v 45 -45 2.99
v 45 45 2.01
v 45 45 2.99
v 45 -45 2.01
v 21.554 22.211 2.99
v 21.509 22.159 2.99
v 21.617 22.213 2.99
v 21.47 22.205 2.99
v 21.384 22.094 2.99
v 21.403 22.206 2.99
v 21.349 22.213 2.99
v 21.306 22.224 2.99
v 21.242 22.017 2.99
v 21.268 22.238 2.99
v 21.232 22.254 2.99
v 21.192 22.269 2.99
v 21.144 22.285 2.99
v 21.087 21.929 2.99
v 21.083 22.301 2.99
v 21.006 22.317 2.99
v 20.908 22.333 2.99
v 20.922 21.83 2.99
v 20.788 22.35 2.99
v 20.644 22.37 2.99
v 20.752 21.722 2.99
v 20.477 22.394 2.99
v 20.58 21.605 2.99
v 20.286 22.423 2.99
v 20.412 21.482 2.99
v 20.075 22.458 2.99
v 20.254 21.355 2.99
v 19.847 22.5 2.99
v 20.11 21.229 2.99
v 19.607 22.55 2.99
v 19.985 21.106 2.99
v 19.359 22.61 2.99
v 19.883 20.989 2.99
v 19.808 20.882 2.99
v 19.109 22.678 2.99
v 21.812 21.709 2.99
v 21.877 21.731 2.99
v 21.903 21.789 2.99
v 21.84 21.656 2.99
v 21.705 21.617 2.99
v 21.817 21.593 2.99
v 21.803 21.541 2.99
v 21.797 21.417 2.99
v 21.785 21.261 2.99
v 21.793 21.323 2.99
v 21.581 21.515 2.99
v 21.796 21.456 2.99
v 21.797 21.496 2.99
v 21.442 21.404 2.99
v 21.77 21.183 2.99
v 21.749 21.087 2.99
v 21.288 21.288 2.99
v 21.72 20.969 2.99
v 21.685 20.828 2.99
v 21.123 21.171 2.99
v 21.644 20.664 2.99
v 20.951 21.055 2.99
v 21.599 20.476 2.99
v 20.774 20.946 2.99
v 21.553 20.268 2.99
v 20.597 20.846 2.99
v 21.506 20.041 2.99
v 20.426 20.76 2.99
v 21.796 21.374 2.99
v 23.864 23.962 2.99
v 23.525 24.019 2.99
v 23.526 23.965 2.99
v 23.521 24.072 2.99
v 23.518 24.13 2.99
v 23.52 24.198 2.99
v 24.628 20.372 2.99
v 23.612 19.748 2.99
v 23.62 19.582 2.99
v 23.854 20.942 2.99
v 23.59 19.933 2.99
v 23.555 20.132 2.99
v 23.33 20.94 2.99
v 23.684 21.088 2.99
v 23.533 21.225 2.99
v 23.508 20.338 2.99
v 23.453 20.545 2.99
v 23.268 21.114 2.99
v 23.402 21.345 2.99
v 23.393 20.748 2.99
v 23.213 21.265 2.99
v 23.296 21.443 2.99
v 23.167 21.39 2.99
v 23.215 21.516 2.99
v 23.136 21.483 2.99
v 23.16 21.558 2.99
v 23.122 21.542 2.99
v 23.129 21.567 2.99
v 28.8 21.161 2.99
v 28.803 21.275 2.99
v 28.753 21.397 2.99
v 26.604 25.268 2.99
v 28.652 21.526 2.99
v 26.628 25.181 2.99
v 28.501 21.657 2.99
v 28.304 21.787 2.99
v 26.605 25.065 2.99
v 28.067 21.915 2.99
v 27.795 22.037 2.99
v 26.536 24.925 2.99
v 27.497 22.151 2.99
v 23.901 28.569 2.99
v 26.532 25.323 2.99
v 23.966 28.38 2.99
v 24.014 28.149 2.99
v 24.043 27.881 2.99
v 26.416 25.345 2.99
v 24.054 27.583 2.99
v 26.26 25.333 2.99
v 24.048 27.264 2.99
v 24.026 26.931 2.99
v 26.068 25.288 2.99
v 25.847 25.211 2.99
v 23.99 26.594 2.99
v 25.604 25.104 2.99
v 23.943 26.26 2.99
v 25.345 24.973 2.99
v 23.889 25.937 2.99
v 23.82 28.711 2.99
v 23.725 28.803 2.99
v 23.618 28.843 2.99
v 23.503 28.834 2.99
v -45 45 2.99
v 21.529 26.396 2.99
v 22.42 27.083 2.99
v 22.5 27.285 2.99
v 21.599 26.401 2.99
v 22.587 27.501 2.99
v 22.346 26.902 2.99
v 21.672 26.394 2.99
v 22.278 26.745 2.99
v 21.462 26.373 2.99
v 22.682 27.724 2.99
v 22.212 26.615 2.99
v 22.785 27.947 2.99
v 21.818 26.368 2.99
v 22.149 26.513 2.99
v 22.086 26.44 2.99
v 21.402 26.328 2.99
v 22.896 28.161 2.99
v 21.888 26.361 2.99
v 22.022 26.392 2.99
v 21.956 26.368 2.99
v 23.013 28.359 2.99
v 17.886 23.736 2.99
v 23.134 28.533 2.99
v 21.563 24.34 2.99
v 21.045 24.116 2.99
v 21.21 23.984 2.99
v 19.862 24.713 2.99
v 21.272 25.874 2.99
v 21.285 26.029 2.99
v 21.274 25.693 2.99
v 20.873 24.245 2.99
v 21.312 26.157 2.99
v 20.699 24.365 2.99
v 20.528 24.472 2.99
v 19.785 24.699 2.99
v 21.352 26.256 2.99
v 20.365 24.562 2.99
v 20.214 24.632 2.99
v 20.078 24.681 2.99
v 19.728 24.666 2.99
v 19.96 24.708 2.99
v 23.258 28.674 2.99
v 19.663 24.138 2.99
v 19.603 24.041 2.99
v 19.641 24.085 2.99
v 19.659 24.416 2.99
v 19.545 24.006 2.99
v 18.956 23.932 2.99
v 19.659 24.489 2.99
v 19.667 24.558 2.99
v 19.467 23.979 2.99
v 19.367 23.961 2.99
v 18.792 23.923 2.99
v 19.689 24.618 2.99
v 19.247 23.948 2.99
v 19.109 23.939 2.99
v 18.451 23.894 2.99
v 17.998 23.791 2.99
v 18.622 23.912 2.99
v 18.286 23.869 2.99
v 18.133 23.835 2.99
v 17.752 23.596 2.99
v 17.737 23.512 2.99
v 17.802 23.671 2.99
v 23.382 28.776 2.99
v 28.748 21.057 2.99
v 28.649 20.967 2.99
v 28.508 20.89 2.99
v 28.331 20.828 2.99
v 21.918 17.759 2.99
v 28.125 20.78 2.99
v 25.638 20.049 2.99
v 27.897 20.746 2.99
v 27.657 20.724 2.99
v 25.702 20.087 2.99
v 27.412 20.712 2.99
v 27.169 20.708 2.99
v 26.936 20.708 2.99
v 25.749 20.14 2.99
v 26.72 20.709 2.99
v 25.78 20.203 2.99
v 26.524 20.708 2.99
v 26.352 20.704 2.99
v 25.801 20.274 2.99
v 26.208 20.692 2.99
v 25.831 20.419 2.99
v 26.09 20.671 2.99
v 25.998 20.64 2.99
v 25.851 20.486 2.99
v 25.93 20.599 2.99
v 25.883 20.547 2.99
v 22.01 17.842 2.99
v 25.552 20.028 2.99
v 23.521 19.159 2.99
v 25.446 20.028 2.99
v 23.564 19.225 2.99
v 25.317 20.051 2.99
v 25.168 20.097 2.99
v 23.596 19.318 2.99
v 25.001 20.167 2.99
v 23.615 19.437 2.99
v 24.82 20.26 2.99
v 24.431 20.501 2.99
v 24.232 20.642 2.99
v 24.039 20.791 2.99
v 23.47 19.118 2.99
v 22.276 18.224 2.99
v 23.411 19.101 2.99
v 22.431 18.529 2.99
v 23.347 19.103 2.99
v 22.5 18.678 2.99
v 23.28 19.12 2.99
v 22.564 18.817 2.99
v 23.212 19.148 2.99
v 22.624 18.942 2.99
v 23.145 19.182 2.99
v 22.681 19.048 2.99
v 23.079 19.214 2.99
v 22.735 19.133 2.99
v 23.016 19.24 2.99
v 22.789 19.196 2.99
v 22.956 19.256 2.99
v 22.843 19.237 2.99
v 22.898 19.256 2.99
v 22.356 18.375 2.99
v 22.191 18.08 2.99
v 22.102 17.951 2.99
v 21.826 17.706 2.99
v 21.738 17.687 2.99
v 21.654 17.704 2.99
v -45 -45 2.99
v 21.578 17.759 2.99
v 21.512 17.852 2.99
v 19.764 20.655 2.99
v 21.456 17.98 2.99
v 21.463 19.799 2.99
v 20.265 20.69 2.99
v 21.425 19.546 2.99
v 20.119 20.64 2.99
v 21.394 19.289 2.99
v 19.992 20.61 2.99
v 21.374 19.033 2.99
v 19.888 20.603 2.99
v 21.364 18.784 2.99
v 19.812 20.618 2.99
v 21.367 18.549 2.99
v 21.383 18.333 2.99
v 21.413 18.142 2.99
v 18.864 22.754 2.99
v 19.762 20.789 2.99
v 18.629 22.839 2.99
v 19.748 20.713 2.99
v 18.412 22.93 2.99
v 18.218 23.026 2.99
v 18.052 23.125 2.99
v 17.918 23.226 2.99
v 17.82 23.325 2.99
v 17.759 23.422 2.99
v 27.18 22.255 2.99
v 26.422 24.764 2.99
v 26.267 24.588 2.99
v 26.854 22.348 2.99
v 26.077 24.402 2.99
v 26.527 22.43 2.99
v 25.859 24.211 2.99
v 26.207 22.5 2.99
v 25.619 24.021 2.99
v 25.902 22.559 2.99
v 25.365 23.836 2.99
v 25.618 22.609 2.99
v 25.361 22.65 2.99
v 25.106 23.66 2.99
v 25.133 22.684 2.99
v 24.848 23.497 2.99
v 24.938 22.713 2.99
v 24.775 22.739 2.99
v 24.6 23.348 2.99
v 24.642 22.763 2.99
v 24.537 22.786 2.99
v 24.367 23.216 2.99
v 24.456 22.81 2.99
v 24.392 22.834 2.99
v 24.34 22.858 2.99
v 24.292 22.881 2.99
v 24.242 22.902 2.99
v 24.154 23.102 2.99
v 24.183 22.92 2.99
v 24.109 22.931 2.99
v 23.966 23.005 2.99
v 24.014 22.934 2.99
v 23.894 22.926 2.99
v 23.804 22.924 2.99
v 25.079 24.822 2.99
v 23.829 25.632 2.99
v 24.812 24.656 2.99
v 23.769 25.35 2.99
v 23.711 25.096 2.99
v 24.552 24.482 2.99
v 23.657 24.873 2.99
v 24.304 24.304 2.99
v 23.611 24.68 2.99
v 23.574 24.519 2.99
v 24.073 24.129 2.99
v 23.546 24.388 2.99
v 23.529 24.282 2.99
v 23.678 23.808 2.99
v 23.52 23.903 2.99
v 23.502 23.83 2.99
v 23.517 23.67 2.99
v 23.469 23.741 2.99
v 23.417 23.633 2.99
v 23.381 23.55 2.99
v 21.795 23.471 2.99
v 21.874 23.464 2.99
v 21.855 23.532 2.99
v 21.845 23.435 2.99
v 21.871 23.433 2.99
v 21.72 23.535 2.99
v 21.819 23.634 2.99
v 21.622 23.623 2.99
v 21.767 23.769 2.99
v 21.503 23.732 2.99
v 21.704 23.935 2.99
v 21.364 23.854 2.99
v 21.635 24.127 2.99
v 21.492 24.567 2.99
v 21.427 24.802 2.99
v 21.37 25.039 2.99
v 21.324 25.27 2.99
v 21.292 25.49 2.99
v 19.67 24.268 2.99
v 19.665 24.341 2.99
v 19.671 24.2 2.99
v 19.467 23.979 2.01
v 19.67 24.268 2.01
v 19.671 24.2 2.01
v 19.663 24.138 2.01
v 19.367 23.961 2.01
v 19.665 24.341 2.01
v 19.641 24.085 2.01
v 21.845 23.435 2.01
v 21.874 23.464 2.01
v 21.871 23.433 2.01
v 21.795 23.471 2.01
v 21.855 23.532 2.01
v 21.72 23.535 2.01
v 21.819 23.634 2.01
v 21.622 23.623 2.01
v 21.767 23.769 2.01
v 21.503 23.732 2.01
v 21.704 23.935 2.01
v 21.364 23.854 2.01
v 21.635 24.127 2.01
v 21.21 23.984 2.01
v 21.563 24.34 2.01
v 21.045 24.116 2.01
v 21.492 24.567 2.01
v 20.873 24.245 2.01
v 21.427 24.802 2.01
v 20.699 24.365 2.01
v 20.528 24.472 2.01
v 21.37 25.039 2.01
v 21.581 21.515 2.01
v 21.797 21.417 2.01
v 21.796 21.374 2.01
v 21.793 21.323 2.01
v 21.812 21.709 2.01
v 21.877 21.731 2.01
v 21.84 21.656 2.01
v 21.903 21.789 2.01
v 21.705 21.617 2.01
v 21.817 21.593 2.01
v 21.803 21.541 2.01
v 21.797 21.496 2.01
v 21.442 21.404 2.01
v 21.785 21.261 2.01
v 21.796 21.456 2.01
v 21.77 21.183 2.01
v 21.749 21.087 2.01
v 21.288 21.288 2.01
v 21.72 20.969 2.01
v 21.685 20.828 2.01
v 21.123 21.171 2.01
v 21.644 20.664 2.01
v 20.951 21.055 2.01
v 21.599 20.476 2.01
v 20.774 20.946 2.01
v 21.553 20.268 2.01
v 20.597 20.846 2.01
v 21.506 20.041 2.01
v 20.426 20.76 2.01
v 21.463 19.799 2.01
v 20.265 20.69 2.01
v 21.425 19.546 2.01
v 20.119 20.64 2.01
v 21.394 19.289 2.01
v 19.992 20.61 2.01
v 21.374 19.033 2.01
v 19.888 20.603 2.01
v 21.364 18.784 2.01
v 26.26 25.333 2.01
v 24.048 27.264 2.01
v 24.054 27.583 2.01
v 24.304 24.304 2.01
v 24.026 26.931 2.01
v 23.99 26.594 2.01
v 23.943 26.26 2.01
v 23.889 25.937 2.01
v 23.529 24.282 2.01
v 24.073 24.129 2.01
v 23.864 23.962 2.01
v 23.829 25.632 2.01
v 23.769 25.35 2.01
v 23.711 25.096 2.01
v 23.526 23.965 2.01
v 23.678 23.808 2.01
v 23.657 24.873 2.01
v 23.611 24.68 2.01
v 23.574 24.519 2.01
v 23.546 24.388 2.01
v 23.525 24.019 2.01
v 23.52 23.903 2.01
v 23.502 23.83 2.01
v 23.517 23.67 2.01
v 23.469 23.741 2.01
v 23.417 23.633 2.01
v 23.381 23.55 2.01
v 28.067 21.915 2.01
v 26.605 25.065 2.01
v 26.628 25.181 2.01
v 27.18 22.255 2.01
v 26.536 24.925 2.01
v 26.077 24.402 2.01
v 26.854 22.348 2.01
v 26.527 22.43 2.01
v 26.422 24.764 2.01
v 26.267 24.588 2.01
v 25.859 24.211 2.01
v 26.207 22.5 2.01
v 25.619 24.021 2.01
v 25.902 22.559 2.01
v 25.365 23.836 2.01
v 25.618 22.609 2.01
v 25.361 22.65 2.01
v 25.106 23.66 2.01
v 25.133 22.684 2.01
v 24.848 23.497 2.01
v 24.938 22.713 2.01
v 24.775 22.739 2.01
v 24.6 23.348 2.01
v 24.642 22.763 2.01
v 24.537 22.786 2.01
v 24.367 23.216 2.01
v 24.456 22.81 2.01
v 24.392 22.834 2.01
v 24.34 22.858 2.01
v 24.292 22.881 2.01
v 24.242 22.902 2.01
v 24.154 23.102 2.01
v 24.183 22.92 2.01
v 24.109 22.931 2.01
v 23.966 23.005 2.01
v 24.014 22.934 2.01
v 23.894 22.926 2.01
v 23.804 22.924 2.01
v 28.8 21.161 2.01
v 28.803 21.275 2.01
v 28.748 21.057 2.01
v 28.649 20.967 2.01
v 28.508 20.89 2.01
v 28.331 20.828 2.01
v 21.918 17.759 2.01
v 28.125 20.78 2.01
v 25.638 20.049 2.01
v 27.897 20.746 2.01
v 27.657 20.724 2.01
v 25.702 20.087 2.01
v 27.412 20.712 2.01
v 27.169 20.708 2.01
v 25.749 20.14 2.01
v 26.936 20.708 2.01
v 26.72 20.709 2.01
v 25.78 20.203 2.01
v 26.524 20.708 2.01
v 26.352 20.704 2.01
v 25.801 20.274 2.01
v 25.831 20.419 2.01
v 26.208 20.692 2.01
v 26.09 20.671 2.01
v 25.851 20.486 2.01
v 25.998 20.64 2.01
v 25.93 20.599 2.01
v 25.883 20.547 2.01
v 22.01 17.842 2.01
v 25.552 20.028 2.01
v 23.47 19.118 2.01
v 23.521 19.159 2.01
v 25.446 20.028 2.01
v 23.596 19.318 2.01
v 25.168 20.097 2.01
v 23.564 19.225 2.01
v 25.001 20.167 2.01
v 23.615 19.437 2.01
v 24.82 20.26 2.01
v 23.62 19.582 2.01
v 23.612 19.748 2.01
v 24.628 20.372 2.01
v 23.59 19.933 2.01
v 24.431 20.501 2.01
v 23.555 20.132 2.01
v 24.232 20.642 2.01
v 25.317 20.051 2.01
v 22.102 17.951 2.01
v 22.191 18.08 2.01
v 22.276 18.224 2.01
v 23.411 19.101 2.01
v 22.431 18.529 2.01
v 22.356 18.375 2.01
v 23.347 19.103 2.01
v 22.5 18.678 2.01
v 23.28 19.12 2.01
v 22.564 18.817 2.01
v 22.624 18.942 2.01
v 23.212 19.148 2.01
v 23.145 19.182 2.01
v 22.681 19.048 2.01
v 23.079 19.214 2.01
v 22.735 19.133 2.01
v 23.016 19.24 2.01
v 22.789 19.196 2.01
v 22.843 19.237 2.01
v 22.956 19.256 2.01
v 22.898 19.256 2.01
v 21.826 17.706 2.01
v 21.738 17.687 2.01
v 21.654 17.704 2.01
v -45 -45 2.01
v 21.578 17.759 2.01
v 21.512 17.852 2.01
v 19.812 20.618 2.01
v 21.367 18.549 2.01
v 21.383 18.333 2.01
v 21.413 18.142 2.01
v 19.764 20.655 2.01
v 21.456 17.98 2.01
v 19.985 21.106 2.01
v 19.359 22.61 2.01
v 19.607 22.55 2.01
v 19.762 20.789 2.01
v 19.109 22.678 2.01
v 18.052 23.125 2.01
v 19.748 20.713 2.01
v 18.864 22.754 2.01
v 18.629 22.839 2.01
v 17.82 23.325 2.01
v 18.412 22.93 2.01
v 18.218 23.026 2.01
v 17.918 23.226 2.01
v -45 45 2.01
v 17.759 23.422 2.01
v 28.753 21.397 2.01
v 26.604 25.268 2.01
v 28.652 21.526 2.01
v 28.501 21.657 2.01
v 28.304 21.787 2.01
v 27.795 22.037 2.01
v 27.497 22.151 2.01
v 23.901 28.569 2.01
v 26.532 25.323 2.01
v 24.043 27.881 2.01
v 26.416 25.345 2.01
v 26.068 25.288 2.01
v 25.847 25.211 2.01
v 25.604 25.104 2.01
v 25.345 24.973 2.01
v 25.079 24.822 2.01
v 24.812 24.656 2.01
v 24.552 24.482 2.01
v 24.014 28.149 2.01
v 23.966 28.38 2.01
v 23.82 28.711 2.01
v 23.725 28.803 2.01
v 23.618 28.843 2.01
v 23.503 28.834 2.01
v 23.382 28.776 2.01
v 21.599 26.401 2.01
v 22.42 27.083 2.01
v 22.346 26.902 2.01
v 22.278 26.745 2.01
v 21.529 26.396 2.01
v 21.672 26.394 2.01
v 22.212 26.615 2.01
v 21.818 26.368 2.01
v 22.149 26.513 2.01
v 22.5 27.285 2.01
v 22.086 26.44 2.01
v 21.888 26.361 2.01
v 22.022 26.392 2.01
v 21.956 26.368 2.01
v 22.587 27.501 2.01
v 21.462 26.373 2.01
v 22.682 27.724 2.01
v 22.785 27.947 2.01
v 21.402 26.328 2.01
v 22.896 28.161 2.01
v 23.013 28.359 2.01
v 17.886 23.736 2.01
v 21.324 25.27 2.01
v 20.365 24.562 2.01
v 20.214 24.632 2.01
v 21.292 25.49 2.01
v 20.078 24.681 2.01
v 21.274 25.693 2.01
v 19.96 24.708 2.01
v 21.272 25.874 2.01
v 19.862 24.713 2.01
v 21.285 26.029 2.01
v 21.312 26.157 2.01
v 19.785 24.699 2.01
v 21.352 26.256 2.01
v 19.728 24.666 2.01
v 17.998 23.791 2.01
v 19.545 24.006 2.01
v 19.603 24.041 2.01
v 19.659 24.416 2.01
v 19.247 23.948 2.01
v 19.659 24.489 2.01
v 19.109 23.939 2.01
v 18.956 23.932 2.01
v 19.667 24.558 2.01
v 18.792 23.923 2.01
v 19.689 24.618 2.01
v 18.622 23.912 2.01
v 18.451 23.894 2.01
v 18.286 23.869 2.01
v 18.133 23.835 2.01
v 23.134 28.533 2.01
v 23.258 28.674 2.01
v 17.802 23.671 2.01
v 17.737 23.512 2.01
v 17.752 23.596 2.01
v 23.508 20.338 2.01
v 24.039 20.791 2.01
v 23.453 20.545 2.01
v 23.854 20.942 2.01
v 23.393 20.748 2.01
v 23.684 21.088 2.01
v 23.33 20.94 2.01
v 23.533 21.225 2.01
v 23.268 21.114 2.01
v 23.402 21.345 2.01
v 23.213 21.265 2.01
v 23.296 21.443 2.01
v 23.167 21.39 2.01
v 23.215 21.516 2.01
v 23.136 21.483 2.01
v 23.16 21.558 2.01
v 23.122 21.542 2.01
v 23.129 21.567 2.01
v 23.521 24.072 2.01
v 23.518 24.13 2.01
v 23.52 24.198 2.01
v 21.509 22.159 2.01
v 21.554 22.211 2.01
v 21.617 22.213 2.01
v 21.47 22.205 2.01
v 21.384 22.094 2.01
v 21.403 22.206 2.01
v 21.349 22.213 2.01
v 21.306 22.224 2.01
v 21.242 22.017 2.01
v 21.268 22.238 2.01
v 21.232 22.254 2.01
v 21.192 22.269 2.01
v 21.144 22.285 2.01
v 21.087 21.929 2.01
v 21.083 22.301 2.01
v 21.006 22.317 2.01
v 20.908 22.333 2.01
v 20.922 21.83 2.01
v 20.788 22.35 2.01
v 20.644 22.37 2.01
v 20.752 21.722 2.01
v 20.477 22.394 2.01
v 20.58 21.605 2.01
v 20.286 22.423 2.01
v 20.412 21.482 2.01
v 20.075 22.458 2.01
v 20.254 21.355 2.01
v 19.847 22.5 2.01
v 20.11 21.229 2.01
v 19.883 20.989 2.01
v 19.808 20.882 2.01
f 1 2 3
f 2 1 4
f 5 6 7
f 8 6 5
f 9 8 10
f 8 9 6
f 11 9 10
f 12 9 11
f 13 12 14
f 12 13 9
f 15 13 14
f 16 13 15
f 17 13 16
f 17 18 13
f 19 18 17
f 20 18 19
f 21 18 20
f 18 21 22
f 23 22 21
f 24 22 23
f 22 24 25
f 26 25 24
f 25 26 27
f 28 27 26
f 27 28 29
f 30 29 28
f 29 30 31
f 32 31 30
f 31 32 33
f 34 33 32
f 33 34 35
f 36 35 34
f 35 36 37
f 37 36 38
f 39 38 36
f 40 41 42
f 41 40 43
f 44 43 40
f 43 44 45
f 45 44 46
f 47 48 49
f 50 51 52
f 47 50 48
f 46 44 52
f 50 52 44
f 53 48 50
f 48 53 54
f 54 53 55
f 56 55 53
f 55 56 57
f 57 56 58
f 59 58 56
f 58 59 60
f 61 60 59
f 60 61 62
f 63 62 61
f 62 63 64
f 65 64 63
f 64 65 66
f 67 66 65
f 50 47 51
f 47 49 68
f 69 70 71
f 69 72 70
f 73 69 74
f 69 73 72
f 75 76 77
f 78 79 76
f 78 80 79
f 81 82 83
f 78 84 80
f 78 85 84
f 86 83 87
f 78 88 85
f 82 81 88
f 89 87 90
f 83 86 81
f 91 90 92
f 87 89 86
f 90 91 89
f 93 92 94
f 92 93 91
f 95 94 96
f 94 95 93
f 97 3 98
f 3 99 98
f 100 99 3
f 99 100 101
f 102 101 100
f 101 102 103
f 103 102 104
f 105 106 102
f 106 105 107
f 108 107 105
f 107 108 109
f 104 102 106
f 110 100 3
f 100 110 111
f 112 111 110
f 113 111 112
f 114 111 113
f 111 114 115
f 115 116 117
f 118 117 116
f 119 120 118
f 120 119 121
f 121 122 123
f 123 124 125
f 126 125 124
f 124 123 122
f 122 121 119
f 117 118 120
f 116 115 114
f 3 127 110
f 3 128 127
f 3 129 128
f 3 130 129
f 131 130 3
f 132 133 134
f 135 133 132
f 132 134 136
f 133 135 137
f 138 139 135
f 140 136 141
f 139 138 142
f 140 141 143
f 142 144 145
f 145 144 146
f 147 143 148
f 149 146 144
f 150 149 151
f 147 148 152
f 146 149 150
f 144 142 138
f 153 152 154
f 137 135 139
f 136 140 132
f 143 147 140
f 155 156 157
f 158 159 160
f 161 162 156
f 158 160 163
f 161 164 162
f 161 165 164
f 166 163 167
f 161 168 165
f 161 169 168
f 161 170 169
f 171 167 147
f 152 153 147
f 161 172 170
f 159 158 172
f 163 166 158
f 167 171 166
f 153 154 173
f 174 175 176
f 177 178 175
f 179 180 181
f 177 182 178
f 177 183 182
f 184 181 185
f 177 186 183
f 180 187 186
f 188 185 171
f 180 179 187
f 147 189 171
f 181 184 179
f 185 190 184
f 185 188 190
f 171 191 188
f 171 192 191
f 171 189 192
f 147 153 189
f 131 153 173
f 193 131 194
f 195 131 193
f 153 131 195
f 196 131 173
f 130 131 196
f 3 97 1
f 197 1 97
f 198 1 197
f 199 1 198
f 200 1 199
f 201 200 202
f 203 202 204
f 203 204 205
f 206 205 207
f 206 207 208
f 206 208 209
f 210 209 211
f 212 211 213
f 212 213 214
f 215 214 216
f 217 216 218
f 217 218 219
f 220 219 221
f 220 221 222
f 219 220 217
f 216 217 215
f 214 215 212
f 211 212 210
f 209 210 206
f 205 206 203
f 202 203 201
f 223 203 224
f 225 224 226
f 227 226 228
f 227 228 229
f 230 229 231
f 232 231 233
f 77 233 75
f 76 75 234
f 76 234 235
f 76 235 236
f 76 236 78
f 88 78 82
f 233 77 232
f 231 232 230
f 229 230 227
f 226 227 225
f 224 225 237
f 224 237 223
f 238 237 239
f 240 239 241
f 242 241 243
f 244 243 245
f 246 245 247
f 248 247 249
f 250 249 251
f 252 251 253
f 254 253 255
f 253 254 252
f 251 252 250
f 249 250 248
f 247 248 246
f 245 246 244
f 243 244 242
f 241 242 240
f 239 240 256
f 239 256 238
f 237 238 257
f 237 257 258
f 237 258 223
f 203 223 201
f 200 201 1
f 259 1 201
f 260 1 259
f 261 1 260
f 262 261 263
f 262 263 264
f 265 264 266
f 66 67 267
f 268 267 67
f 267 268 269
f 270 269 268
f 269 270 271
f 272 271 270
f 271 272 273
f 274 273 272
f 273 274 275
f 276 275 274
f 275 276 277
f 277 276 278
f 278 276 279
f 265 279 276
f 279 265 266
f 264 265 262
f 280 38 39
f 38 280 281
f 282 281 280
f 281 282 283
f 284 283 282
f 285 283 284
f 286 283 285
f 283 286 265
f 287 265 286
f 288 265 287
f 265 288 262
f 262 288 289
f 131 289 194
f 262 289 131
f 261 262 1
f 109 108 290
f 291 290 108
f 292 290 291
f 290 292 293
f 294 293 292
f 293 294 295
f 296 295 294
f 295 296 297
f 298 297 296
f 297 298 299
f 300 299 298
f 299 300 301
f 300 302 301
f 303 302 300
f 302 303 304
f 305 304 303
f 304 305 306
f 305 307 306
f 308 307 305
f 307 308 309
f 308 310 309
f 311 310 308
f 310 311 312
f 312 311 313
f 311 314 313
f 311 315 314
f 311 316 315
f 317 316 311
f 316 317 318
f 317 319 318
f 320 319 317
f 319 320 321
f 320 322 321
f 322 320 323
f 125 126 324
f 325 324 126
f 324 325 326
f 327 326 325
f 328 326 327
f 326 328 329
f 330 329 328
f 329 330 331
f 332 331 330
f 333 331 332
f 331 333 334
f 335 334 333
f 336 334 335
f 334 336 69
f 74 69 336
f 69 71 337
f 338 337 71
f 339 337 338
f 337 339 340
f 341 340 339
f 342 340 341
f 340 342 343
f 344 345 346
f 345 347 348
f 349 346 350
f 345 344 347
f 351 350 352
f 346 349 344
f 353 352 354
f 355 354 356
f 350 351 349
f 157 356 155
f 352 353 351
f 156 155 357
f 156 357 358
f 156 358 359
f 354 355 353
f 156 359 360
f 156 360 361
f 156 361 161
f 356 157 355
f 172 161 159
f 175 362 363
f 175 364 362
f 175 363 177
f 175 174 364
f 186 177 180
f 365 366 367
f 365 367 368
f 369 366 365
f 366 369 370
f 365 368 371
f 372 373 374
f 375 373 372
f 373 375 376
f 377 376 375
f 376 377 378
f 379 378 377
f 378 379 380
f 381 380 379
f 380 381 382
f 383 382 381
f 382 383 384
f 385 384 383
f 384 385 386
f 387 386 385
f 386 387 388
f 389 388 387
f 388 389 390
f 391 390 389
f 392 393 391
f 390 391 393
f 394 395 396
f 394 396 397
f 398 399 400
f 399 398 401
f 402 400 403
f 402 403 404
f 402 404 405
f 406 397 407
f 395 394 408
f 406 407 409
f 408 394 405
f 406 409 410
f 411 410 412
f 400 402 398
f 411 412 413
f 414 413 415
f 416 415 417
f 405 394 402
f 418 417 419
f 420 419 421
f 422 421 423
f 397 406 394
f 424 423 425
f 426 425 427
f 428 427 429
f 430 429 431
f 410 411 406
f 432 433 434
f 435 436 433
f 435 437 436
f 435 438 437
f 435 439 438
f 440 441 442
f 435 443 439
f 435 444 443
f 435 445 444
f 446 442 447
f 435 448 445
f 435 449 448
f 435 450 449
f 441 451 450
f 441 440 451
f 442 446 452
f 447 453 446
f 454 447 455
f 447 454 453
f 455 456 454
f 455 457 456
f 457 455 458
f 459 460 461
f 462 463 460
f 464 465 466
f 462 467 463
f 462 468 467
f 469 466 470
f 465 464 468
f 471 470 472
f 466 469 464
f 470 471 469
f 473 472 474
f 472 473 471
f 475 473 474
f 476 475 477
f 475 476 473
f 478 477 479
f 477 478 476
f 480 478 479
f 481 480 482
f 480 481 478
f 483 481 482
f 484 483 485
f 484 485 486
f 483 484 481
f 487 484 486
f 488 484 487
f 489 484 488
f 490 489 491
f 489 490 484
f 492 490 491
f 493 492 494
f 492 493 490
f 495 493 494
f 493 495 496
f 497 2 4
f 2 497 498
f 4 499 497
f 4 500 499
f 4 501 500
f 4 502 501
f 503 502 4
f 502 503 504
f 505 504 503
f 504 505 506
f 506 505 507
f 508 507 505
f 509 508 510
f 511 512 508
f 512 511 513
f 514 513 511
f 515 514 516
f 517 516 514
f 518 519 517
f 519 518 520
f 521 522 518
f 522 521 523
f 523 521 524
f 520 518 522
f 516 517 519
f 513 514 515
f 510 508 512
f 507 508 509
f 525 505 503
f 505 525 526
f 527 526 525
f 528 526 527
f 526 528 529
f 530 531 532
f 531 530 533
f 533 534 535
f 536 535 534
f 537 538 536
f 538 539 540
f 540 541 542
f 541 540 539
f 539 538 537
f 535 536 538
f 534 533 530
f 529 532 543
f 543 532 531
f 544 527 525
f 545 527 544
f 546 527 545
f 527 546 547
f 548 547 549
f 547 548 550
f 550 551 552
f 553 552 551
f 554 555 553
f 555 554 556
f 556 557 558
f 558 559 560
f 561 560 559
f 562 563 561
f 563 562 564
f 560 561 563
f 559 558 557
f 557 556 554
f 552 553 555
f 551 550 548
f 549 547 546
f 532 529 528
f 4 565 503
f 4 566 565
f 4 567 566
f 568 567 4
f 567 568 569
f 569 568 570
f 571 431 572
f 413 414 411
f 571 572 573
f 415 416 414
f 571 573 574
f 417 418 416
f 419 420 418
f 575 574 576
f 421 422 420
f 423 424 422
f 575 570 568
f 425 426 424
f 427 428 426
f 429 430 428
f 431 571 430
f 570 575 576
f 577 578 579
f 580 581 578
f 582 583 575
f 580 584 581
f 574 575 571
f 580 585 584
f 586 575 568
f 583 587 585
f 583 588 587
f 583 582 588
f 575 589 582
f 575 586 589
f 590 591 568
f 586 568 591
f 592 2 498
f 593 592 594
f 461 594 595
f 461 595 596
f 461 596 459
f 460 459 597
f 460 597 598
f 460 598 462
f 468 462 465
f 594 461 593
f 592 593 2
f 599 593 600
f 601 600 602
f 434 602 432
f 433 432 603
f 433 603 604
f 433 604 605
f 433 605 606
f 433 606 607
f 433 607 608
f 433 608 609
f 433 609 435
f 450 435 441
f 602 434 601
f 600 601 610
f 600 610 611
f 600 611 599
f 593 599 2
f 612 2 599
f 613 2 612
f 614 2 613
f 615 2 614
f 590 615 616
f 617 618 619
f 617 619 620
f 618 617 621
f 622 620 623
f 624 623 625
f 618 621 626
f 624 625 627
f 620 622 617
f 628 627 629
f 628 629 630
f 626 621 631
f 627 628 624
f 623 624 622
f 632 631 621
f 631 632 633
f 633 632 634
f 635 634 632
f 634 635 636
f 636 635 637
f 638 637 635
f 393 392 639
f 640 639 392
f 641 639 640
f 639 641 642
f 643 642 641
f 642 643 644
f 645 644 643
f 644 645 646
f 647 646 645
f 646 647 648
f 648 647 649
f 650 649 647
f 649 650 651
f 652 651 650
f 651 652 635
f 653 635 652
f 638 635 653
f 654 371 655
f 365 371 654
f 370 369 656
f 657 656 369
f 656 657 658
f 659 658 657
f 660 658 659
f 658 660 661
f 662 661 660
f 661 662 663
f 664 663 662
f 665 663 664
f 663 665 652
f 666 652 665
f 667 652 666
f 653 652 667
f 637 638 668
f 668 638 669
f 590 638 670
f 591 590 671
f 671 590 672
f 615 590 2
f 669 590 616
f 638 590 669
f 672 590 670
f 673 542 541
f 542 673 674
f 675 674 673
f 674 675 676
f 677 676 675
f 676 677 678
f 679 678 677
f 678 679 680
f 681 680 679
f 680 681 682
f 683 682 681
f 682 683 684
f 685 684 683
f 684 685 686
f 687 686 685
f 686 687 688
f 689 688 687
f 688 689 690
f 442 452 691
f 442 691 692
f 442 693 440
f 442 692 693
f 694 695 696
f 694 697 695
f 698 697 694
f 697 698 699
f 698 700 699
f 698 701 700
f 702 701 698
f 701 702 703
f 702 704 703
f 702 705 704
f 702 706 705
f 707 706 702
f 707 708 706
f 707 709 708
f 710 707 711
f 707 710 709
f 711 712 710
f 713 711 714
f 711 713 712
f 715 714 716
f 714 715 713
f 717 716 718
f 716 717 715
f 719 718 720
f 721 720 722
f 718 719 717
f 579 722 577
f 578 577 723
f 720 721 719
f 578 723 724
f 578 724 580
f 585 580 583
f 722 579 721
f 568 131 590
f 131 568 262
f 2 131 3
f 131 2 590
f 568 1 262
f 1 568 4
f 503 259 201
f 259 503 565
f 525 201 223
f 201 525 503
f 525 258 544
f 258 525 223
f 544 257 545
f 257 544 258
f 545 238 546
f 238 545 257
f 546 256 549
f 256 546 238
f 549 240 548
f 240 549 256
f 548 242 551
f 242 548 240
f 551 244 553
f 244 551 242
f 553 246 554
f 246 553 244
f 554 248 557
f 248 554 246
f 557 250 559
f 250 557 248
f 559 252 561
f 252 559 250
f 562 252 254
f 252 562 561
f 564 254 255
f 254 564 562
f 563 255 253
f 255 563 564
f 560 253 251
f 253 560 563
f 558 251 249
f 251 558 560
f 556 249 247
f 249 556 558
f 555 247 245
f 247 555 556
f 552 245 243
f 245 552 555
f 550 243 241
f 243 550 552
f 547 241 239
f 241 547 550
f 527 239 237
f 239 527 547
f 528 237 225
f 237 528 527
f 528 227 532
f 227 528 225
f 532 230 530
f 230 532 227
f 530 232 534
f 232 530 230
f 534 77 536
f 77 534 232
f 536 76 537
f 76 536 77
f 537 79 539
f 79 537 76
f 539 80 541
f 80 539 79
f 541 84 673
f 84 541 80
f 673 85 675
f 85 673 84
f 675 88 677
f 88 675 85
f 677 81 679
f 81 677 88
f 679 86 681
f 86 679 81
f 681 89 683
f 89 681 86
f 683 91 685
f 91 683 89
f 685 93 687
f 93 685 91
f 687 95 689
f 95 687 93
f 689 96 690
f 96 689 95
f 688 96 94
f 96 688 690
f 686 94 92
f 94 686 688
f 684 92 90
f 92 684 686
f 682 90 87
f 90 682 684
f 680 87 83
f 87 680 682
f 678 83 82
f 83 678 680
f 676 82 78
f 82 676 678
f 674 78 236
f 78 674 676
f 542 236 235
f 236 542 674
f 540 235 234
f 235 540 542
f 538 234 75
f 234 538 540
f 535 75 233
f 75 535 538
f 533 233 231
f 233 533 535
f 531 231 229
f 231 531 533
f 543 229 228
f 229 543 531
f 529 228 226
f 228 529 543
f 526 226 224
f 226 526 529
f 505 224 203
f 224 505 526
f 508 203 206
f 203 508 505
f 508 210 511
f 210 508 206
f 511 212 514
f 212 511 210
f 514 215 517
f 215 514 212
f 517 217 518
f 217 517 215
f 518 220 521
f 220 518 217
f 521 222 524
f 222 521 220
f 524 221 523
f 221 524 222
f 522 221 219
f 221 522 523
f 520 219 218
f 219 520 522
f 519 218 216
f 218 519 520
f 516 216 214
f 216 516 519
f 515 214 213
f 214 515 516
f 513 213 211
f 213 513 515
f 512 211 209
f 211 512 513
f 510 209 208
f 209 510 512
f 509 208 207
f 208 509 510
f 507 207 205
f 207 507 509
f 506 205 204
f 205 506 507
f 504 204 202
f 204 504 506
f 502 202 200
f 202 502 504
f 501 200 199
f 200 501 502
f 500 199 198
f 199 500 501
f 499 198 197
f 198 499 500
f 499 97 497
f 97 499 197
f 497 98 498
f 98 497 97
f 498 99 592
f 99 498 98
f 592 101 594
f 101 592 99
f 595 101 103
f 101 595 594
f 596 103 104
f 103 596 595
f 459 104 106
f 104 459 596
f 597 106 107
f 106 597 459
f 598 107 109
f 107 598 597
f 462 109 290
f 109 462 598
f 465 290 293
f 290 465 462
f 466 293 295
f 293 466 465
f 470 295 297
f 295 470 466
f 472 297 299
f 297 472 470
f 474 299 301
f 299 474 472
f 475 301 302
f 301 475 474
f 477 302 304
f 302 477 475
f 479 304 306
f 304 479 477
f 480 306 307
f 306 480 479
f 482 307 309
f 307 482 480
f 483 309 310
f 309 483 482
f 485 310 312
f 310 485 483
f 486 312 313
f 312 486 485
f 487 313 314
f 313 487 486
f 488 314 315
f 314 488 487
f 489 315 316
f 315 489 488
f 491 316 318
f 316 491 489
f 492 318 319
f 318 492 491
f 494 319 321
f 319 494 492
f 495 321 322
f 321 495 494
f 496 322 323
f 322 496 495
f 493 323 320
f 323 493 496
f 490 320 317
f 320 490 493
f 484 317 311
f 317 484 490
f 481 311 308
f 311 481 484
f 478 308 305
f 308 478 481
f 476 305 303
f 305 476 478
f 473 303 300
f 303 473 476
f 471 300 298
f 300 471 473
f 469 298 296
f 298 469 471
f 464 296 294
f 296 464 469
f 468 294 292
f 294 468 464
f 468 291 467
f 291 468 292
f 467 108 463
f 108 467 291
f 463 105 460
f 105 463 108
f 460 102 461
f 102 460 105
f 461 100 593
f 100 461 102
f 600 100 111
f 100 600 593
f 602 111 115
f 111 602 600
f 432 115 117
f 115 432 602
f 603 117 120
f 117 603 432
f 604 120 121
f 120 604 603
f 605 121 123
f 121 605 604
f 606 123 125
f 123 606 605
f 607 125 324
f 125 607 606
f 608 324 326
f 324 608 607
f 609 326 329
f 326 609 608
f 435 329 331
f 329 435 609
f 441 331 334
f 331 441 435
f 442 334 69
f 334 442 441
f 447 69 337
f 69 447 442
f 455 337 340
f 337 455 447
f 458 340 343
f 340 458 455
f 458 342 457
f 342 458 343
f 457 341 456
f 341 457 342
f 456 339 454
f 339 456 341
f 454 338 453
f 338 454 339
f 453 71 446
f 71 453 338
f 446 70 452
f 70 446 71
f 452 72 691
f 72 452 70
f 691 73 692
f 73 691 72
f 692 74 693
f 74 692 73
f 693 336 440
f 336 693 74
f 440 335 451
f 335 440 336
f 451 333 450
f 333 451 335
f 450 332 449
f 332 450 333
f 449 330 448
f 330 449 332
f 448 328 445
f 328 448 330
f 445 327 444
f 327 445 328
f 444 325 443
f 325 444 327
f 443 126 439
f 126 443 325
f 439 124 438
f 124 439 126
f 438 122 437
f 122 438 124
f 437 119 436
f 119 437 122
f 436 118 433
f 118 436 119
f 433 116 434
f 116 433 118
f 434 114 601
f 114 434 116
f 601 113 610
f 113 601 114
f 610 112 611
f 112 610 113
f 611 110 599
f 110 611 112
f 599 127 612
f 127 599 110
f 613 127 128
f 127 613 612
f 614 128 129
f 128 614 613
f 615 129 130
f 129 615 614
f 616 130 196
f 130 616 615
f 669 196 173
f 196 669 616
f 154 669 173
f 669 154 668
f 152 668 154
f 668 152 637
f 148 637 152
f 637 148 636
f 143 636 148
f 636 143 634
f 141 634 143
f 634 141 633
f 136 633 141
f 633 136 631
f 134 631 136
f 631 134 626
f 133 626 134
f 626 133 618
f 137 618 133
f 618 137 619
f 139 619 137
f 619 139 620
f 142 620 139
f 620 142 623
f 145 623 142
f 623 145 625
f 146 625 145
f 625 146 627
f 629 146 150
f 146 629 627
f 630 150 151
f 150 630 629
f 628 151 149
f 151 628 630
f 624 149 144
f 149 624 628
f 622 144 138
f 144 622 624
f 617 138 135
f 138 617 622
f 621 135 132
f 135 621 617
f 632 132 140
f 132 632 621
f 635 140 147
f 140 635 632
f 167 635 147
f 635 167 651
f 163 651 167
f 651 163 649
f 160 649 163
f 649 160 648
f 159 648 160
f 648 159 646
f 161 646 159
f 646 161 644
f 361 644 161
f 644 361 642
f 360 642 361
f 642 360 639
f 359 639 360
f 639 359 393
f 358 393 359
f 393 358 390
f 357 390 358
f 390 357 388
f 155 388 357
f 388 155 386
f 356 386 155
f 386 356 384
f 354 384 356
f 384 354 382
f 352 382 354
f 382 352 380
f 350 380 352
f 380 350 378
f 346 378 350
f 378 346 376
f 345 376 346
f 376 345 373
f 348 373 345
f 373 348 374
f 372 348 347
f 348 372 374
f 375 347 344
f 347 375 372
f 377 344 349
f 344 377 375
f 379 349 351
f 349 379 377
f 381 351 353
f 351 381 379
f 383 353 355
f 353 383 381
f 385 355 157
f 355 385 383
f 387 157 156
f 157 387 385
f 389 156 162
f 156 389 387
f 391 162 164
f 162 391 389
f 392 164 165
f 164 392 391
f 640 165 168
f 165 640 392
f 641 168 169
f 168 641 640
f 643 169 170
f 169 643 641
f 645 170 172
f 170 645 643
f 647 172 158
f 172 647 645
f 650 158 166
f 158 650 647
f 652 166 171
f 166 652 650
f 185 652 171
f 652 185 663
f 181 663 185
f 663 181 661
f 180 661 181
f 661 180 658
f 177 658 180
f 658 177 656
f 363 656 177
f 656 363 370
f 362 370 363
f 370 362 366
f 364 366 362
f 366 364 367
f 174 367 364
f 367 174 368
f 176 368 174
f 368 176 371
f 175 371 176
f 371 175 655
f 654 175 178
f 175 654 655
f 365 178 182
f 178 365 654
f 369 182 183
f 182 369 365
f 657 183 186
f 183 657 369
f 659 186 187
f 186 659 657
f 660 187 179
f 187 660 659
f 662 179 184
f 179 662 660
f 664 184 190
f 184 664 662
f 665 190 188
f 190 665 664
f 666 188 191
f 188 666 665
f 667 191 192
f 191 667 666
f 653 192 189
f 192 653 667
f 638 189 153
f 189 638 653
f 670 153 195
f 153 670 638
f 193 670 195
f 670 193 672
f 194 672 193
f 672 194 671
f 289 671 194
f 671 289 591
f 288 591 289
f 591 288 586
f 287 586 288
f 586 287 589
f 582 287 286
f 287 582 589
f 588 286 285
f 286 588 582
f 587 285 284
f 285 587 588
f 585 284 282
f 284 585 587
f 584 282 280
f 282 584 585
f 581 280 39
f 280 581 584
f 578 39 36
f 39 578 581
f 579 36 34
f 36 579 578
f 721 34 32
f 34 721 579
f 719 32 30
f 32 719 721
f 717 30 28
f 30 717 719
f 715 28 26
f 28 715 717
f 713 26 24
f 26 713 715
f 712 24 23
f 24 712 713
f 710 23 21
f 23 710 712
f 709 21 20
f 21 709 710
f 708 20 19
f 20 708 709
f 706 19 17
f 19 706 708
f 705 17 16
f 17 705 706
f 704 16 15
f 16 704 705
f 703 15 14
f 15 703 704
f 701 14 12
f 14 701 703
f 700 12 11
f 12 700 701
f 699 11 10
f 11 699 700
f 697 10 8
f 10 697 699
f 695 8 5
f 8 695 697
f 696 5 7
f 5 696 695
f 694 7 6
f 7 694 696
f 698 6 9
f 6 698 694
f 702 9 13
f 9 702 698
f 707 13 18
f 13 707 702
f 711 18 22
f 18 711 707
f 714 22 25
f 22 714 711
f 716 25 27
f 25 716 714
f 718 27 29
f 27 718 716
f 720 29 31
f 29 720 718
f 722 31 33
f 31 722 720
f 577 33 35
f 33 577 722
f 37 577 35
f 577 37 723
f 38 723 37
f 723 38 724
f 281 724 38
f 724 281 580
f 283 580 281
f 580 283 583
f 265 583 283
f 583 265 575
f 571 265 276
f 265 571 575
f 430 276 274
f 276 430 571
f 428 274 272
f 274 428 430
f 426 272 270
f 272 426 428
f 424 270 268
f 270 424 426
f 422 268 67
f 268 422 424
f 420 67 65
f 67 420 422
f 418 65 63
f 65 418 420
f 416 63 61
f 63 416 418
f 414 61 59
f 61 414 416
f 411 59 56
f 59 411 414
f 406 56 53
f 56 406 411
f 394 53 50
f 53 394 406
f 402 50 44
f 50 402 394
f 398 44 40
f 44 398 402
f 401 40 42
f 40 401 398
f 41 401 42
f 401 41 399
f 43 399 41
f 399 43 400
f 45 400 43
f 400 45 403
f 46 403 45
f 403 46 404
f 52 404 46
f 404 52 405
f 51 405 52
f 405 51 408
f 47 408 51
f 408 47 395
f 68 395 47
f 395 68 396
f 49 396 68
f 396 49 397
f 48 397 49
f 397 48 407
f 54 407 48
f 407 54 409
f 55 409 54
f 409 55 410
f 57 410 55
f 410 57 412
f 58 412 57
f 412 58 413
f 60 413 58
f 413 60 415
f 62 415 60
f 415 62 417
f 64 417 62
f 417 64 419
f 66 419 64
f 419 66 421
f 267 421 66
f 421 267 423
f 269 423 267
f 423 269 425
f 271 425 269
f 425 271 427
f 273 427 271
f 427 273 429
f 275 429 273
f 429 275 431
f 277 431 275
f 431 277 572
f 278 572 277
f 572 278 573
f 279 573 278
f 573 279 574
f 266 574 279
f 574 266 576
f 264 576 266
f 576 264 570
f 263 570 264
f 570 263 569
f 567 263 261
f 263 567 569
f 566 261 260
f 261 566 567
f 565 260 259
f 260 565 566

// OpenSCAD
//$fn = 4;

ATOM = 0.01;
pi = 180;

STEP1 = 1;
K = 10;
D = 90;

THICKNESS = 1;

COLORS = [
"LightYellow",
    "PowderBlue",
    "LightBlue",
"Yellow",
    "SkyBlue",
    "LightSkyBlue",
"Gold",
    "DeepSkyBlue",
    "DodgerBlue",
"Orange",
    "CornflowerBlue",
    "RoyalBlue",
"DarkOrange",
    "Blue",
    "MediumBlue",
"OrangeRed",
    "DarkBlue",
    "Navy",
"Tomato",
    "MidnightBlue"
];

/*
 * Generate a segment
 */
module seg(x1, y1, x2, y2, thickness_k=1) {
    hull() {
        translate([x1, y1, 0])
        cylinder(d=THICKNESS*thickness_k);
        translate([x2, y2, 0])
        cylinder(d=THICKNESS*thickness_k);
    }
}

////////////////////////////////////////////////////////////////////////////////
// BUTTERFLY
////////////////////////////////////////////////////////////////////////////////

/*
 * Generate various butterfly shapes
 */

// http://www.matcmp.ncc.edu/~glassr/y2m_2005/samples.htm
function r1(t) = (abs(1 + 2*pow(cos(4*t), 3) - sin(2*t)) + .75)
                 * (1 + cos(t-45)*.2);

function rn(t, n) = r1(t+11) * pow(3, n*.5) / 20;
function fx(t, n) = cos(t) * rn(t, n) * K;
function fy(t, n) = sin(t) * rn(t, n) * K;
function points(n) = [ for(t=[0:STEP1:360]) [fx(t, n), fy(t, n)]];

/*
 * Generate filled butterfly
 */
module butterfly(n) {
    linear_extrude(1)
    polygon(points(n));
}

/*
 * Generate butterfly border
 */
/*
module butterfly_border(n) {
    difference() {
        linear_extrude(1)
        offset(delta=THICKNESS)
        polygon(points(n));

        linear_extrude(1)
        polygon(points(n));
    }
}
*/

/*
 * Generate plate with a butterfly hole
 */
module butterfly_plate(n) {
    translate([0, 0, n])
    difference() {
        translate([0, 0, .5])
        cube([D, D, 1-ATOM*2], true);
        
        translate([D/4, D/4, -.5])
        scale([1, 1, 2])
        butterfly(n);
    }
}

if(0)
for (i=[1: 0.5: 4]) {
    color(COLORS[i*2])
    butterfly_plate(i);
}
butterfly_plate(2);

////////////////////////////////////////////////////////////////////////////////
// FLOWER
////////////////////////////////////////////////////////////////////////////////

/*
 * Generate various flower shapes
 */

function rfn(t, k) = (0.1+cos(k*t)) / 2; //  rf1(t+11) * pow(3, n*.5) / 20;
function ffx(t, k) = cos(t) * rfn(t, k) * K;
function ffy(t, k) = sin(t) * rfn(t, k) * K;
function fpoints(k) = [ for(t=[0:STEP1:360]) [ffx(t, k), ffy(t, k)]];

/*
 * Generate filled flower
 */
NN = 6;
module flower(k) {
    linear_extrude(1) {
        for(n=[1:NN]) {
            for(d=[1:NN]) {
                k = n/d;
                translate([((n-1)-(NN-1)/2)*D/8, ((d-1)-(NN-1)/2)*D/8, 0])
                polygon(fpoints(k));
            }
        }
    }
}

/*
 * Generate plate with a flower hole
 */
module flower_plate(n) {
    translate([0, 0, n])
    intersection() {
        translate([0, 0, .5])
        cube([D, D, 1-ATOM*2], true);
        
        translate([0, 0, -.5])
        scale([1, 1, 2])
        flower(n);
    }
}

if(0)
    for (i=[1: 0.5: 4]) {
    color(COLORS[i*2])
    flower_plate(i);
}

color("lightblue")      flower_plate(1);
//color("blue")           flower_plate(2);
//color("darkblue")       flower_plate(3);
//color("LightSkyBlue")   flower_plate(4);

////////////////////////////////////////////////////////////////////////////////
// MESHS
////////////////////////////////////////////////////////////////////////////////

// Mesh: cartesian -> polar -> distortion -> cartesian
function aa(x, y, i, r) = atan2(y, x); // + i*sin(r);
function rr(x, y, i) = sqrt(x*x + y*y) / 1.7 * pow(1-i/110, 2);

function xx1(x, y, i) = let(r=rr(x, y, i), a=aa(x, y, i, r))
                    fr(r, a)*cos(fa(r, a));
function yy1(x, y, i) = let(r=rr(x, y, i), a=aa(x, y, i, r))
                    fr(r, a)*sin(fa(r, a));

function xx2(x, y, i) = let(r=rr(x, y, i), a=aa(x, y, i, r))
                    fr(r, a)*cos(fa(r, a));
function yy2(x, y, i) = let(r=rr(x, y, i), a=aa(x, y, i, r))
                    fr(r, a)*sin(-fa(r, a));

// Mesh distortion
function fr(r, a) = r; //         +sin(a*8)*4;
function fa(r, a) = a + r*r/50;

/*
 * Generate distored mesh
 */
module mesh1(index) {
    space = 20;
    step = 5;
    //thickness_k = 1;
    thickness_k = 3 - index/1.5;

    // X mesh lines
    for (y=[-D:space:D]) {
        for (x=[-D:step:D-step]) {
            x0 = x;
            y0 = y;
            x1 = x+step;
            y1 = y;
            seg(xx1(x0, y0, index), yy1(x0, y0, index),
                xx1(x1, y1, index), yy1(x1, y1, index),
                thickness_k);

            seg(xx2(x0, y0, index), yy2(x0, y0, index),
                xx2(x1, y1, index), yy2(x1, y1, index),
                thickness_k);
        }
    }

    // Y mesh lines
    for (y=[-D:space:D]) {
        for (x=[-D:step:D-step]) {
            x0 = x;
            y0 = y;
            x1 = x+step;
            y1 = y;
            seg(xx1(y0, x0, index), yy1(y0, x0, index),
                xx1(y1, x1, index), yy1(y1, x1, index),
                thickness_k);
            seg(xx2(y0, x0, index), yy2(y0, x0, index),
                xx2(y1, x1, index), yy2(y1, x1, index),
                thickness_k);
        }
    }
}

/*
module mesh2() {
    STEP2 = 12;
    R = D/2;
    for (i=[0:STEP2:360-STEP2]) {
        x= R * cos(i);
        y= R * sin(i);
        translate([x, y, 0])
        difference() {
            cylinder(d=R+THICKNESS/2);
            translate([0, 0, -.75])
            cylinder(d=R-THICKNESS/2, h=2);
        }
    }
}
*/

/*
 * Generate plate with mesh cutouts and butterfly hole
 */
module mesh_plate(z, n, next=0) {
    n2 = 1 + z/2.75;
    color(COLORS[z])
    translate([0, 0, z])
    difference() {
        // clip
        intersection() {
            translate([0, 0, .5])
            cube([D, D, 1-ATOM*2], true);

            union() {
                // mesh
                mesh1(n2);
                
                // butterfly border
                butterfly_border(n);

                // next butterfly
                if (next) {
                    butterfly(next);
                    butterfly_border(next);
                }

                // frame
                translate([0, 0, .5])
                difference() {
                    cube([D, D, 1], true);
                    cube([D-THICKNESS*2, D-THICKNESS*2, 2], true);
                }

            }
        }
        // bore butterfly
        translate([0, 0, -.5])
        scale([1, 1, 2])
        butterfly(n);
    }
}

module all() {
    mesh_plate(0, 1, 1);
    mesh_plate(1, 1, 2);

    mesh_plate(2, 2, 2);
    mesh_plate(3, 2, 3);

    mesh_plate(4, 3, 3);
    mesh_plate(5, 3, 4);

    mesh_plate(6, 4);
    mesh_plate(7, 4);
}


//all();
